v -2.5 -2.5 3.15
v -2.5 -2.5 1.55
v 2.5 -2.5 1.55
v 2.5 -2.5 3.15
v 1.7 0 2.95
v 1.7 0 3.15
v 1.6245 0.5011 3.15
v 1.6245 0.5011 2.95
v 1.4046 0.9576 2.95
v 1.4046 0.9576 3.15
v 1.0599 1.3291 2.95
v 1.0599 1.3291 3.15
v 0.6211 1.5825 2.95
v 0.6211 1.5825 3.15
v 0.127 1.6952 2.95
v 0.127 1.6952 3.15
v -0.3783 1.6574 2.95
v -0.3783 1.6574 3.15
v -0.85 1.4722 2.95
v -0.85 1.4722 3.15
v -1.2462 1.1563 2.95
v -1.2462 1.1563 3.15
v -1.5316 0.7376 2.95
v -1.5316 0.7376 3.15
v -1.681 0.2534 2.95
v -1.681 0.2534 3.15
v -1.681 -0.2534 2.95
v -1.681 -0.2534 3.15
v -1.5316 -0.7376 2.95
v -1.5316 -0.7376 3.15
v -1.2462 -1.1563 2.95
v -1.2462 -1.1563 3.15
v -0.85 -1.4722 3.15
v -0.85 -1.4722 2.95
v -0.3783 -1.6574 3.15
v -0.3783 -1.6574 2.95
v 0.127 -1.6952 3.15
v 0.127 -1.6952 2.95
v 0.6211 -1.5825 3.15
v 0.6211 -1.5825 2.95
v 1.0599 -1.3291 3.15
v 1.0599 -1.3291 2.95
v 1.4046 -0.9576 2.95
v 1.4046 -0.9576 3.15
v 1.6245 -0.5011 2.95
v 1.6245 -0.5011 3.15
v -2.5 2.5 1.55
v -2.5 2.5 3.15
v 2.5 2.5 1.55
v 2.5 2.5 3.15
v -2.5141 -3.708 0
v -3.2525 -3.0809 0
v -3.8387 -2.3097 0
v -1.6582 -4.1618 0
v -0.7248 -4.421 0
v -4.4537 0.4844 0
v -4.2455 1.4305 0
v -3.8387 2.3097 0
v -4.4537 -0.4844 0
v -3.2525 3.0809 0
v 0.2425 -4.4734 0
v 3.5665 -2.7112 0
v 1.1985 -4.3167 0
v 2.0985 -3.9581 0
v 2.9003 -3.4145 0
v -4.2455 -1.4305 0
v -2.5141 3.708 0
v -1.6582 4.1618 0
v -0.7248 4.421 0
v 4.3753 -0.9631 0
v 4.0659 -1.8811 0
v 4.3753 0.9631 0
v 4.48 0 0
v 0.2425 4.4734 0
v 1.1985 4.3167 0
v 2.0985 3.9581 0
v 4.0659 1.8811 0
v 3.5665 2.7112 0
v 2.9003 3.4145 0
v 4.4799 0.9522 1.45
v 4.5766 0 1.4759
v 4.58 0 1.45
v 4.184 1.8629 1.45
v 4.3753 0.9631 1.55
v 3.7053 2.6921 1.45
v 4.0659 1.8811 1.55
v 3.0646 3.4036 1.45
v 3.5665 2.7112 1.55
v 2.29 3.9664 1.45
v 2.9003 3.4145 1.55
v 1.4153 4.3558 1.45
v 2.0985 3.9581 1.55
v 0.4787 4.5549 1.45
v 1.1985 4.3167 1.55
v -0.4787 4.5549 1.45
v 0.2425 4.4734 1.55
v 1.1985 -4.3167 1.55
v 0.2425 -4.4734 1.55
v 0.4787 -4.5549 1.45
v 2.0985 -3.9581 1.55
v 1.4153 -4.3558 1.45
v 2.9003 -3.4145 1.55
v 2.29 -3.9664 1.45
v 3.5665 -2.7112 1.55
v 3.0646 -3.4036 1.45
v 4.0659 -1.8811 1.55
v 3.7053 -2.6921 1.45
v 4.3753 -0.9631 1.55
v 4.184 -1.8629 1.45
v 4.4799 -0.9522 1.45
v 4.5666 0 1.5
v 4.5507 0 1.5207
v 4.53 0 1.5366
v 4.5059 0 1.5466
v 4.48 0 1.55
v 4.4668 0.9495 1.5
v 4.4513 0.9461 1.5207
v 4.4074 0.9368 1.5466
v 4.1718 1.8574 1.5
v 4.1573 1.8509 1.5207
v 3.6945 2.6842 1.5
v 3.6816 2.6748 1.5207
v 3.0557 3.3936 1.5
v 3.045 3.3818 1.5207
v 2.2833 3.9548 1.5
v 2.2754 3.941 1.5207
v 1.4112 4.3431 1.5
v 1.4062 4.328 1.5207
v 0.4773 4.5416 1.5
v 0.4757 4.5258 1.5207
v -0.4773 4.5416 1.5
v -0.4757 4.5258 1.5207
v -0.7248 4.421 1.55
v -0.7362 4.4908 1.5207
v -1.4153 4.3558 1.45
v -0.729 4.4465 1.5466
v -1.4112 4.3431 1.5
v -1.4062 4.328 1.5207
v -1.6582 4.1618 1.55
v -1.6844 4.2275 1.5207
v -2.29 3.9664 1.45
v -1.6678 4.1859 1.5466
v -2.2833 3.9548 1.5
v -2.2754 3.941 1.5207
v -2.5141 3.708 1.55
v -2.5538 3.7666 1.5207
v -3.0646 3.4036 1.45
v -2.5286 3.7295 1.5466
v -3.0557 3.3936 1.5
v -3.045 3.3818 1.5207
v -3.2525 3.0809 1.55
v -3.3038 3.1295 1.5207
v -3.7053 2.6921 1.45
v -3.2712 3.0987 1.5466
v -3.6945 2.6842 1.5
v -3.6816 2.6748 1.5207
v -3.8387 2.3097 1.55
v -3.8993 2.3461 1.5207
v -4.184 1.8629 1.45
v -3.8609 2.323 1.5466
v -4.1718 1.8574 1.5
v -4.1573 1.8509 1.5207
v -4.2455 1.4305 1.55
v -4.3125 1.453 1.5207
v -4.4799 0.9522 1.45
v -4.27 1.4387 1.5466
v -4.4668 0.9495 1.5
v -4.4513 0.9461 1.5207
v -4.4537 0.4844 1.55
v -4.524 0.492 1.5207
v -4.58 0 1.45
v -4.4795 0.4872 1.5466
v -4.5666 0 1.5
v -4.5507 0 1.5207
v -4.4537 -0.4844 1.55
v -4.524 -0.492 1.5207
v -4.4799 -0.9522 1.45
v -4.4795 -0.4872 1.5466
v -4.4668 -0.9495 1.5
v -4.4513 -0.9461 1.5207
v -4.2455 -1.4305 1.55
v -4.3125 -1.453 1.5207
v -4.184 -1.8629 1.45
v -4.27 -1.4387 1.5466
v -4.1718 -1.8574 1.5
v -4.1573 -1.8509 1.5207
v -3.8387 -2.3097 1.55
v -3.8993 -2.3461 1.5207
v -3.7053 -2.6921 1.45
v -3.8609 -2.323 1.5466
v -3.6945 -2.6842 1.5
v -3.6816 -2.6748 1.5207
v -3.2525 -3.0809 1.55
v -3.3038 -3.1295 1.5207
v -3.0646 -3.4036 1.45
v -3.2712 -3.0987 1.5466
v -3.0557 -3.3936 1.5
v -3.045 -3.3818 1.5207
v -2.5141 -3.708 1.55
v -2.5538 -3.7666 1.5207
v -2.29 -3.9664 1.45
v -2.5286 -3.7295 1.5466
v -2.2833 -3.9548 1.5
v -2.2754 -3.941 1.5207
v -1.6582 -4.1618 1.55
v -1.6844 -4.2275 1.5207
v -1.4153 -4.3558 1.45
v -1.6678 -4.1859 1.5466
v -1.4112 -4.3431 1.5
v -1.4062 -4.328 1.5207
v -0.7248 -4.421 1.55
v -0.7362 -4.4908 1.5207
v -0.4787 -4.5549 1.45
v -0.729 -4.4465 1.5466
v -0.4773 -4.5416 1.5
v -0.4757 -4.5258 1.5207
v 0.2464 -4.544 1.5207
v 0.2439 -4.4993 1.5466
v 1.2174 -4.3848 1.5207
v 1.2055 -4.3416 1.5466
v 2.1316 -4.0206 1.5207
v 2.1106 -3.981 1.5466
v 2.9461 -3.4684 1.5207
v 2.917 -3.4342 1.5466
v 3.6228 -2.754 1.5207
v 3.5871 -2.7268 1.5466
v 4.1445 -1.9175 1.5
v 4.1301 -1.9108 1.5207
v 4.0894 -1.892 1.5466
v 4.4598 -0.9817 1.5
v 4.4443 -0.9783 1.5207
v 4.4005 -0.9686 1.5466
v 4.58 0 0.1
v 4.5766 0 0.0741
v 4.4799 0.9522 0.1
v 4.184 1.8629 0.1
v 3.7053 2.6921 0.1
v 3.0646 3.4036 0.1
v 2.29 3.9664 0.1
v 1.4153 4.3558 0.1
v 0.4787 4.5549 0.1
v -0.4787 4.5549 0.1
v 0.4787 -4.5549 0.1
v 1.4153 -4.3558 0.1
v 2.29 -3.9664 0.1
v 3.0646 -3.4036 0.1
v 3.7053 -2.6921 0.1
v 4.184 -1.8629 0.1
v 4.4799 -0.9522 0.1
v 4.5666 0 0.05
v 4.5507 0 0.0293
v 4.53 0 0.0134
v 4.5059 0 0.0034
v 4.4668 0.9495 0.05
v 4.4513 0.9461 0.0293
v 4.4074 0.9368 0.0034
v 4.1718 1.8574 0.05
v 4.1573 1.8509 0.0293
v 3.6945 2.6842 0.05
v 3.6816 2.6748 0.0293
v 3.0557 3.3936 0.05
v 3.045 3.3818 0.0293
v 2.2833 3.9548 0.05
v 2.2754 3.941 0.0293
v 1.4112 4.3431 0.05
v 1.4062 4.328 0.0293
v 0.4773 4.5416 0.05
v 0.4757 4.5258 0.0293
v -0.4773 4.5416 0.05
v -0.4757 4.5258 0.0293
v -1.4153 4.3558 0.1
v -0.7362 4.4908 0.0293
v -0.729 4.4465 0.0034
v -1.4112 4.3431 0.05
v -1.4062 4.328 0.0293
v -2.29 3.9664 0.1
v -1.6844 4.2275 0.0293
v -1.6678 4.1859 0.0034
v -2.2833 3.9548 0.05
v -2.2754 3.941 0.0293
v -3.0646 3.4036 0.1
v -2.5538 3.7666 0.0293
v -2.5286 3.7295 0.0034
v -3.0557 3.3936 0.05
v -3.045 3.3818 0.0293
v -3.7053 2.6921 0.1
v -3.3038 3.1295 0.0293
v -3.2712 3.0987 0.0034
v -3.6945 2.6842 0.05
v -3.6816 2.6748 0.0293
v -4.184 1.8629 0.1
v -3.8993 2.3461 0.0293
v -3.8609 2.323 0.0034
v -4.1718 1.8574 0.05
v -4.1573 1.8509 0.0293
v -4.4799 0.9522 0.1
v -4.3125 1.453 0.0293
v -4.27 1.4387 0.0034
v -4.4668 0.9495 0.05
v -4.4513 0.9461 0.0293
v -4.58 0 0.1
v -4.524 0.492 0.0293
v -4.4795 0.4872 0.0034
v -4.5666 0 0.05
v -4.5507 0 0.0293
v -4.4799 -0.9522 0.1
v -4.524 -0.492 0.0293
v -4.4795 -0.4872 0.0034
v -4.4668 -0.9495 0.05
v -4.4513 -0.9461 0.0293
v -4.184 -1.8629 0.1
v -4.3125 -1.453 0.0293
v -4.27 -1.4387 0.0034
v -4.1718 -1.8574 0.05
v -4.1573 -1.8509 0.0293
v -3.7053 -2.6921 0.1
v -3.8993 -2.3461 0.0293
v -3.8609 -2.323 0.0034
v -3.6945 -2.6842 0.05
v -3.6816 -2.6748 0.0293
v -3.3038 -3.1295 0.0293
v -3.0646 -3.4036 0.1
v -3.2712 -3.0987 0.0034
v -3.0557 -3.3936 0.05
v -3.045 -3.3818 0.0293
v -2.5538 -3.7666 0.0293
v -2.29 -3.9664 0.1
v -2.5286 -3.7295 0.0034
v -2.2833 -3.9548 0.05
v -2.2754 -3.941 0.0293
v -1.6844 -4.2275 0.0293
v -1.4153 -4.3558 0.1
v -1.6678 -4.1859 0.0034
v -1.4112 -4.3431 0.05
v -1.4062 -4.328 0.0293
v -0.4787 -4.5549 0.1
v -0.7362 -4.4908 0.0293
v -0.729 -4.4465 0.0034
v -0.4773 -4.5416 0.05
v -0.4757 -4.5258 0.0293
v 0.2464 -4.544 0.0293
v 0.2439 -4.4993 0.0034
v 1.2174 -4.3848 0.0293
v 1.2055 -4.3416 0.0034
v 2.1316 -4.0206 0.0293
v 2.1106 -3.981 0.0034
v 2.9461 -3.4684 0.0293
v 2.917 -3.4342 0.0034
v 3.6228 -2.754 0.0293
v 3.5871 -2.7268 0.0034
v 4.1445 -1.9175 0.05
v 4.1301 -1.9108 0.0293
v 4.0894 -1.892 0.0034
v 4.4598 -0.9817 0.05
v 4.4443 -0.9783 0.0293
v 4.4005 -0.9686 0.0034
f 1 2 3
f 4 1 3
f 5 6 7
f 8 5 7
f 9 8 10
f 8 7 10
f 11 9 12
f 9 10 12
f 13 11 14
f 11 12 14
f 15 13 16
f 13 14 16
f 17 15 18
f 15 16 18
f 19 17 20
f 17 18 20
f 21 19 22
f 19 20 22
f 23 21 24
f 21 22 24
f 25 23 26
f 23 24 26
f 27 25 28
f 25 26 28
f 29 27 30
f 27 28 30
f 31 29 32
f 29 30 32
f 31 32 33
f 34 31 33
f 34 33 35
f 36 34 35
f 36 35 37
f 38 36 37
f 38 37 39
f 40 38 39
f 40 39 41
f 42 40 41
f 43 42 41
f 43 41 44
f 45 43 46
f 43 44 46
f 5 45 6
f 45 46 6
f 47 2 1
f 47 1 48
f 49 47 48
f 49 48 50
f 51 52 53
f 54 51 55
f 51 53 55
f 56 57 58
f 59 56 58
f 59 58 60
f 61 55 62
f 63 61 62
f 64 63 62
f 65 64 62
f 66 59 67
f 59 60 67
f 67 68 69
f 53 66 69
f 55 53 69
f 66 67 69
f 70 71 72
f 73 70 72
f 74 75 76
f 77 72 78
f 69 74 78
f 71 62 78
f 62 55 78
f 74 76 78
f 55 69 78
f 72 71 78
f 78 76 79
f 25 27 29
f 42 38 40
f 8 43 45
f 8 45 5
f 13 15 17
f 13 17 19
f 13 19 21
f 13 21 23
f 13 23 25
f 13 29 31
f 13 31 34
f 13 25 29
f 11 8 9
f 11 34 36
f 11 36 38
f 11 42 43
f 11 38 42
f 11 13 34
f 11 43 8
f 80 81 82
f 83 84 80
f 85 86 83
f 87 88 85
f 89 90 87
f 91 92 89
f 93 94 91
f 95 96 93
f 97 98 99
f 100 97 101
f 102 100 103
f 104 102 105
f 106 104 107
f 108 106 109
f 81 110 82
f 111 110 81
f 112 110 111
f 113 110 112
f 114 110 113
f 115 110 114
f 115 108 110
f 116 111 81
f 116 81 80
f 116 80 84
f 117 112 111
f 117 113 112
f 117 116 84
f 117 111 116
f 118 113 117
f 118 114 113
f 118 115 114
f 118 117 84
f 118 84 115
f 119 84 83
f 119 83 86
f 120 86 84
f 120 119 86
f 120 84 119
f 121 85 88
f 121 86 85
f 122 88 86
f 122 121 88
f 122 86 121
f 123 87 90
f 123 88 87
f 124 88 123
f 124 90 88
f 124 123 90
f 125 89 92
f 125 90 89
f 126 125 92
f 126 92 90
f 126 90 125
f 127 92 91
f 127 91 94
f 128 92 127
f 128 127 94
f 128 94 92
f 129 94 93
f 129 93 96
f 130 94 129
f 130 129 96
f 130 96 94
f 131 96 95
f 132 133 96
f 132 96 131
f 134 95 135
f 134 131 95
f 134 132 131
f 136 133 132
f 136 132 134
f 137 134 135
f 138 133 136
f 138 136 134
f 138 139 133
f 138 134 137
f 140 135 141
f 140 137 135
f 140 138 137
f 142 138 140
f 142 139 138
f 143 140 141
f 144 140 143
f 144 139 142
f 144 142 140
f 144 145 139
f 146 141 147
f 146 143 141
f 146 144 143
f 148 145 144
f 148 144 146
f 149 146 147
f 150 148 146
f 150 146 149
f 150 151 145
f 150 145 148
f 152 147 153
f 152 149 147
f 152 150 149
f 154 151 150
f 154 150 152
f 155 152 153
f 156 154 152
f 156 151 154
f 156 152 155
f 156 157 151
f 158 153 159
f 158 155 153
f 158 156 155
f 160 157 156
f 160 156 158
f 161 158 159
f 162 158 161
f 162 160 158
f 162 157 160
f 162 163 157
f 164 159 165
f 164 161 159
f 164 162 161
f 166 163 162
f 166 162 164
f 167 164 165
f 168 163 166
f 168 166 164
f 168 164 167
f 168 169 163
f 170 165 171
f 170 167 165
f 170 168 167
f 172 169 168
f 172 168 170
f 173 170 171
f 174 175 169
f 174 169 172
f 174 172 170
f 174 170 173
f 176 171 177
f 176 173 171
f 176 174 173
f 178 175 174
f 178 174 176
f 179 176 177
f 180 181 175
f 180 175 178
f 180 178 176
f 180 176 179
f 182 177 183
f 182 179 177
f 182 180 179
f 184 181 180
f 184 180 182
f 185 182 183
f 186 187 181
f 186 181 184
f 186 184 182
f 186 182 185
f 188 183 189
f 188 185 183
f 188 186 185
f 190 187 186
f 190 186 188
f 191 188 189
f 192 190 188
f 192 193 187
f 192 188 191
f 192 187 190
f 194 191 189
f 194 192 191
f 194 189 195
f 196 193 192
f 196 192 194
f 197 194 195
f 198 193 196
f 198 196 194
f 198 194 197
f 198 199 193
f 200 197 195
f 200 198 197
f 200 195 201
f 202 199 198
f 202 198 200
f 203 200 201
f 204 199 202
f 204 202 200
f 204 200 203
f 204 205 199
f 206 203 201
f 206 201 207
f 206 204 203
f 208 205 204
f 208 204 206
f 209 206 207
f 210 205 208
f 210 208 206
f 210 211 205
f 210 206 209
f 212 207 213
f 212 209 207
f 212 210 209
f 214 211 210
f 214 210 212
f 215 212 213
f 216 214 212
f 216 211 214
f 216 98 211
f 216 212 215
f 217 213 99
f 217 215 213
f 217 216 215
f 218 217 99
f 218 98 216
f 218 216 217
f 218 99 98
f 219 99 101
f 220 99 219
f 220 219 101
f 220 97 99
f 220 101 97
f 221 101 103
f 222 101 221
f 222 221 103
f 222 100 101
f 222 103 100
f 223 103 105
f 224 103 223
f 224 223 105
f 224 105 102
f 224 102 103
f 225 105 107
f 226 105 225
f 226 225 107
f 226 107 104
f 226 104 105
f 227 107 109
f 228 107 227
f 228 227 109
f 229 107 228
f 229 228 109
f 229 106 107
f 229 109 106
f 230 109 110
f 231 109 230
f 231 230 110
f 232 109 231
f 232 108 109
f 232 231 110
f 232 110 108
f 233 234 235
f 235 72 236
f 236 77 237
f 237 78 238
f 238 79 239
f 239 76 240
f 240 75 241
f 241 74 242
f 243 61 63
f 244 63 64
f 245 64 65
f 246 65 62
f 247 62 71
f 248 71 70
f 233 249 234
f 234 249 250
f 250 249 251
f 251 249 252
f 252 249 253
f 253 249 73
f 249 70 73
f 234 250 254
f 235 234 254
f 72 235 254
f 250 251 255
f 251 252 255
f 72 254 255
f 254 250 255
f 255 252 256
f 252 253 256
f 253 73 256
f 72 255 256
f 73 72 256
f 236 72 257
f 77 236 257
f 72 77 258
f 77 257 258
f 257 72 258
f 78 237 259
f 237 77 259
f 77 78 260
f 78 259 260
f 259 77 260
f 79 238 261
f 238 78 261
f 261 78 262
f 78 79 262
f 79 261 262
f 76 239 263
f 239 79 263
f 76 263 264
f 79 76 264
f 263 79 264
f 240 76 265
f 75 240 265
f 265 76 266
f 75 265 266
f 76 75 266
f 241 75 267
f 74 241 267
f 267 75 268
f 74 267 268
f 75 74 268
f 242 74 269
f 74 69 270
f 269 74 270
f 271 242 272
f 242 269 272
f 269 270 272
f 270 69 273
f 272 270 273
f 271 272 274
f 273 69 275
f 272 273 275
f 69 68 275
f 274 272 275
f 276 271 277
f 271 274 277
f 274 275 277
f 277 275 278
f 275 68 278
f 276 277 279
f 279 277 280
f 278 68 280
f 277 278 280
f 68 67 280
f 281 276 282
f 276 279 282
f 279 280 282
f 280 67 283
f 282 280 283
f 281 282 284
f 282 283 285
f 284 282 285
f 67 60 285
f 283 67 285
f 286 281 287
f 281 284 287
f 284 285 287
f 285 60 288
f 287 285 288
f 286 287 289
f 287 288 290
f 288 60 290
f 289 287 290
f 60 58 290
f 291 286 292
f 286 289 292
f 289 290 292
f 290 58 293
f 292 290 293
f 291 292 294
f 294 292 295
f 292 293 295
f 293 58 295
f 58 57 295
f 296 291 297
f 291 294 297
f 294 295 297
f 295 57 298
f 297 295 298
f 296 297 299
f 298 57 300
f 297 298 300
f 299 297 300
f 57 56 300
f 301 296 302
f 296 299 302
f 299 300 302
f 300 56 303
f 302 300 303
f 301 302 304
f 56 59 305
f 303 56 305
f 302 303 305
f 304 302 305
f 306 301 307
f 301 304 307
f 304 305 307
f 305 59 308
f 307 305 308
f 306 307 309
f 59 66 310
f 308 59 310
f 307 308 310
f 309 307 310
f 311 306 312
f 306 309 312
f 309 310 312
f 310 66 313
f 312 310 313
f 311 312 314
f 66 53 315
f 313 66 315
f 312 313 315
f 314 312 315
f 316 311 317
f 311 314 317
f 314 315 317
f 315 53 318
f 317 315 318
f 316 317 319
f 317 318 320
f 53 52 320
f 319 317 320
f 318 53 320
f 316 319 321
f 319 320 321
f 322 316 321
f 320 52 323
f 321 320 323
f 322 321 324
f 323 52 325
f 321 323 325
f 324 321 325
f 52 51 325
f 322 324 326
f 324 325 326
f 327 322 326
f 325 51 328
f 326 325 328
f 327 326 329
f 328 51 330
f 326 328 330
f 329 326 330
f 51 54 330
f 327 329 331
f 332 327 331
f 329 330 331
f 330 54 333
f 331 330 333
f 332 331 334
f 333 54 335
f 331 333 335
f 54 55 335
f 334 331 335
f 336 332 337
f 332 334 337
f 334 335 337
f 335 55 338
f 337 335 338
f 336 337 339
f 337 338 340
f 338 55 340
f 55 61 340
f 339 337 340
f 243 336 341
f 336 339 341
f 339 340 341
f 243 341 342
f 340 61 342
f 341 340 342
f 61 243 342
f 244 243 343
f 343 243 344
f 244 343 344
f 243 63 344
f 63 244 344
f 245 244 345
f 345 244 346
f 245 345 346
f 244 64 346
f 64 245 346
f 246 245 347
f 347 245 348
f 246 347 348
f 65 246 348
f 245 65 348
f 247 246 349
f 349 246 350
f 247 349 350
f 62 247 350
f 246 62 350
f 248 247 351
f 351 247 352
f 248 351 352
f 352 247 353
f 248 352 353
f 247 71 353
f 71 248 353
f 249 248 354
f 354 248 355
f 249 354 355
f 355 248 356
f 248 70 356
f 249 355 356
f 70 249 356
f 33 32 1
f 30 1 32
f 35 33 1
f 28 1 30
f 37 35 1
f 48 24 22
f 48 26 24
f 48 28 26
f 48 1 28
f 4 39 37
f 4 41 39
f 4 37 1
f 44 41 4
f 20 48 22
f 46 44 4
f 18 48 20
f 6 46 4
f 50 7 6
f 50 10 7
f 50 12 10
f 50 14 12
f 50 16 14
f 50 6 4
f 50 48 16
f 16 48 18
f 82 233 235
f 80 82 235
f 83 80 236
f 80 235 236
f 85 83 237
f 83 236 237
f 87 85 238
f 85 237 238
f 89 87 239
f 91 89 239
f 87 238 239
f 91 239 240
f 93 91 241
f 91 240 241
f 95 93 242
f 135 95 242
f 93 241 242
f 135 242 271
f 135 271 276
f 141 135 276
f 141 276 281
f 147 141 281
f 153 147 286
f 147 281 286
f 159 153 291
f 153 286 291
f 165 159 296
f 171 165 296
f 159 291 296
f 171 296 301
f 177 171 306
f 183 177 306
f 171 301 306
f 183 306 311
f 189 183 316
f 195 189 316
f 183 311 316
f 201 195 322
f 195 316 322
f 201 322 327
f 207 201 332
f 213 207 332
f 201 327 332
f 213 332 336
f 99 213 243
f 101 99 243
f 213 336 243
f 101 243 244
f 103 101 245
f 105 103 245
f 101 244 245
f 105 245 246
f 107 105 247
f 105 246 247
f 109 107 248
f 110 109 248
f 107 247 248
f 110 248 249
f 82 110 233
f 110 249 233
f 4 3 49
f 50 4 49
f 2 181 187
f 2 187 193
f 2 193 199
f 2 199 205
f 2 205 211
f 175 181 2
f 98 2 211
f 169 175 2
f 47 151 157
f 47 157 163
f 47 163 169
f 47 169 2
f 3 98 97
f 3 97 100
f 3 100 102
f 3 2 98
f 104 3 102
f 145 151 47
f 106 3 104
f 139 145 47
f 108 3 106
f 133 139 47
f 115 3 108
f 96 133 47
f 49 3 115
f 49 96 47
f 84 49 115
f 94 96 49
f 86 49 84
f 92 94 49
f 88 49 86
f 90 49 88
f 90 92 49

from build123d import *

# Parameters (mm, degrees)
SKETCH_R     = 4.58
PAD_DEPTH    = 1.55
SKETCH001_W  = 5
SKETCH001_H  = 5
PAD001_DEPTH = 1.6
SKETCH002_R  = 1.7
POCKET_DEPTH = 0.2
FILLET_R     = 0.1


with BuildPart() as part:
    # Sketch → Pad (new body)
    with BuildSketch(Plane.XY):
        Circle(SKETCH_R)
    extrude(amount=PAD_DEPTH)

    # Sketch001 (on Face3 of Pad) → Pad001 (join)
    with BuildSketch(Plane.XY.offset(1.55)):
        Rectangle(SKETCH001_W, SKETCH001_H)
    extrude(amount=PAD001_DEPTH)

    # Sketch002 (on Face8 of Pad001) → Pocket (cut)
    with BuildSketch(Plane.XY.offset(3.15)):
        Circle(SKETCH002_R)
    extrude(amount=-POCKET_DEPTH, mode=Mode.SUBTRACT)

    # Fillet
    fillet_edges = [part.edges().sort_by_distance(p)[0] for p in [
        (-4.58, 0, 0),
        (-4.58, 0, 1.55),
    ]]
    fillet(fillet_edges, radius=FILLET_R)


solid = part.part
